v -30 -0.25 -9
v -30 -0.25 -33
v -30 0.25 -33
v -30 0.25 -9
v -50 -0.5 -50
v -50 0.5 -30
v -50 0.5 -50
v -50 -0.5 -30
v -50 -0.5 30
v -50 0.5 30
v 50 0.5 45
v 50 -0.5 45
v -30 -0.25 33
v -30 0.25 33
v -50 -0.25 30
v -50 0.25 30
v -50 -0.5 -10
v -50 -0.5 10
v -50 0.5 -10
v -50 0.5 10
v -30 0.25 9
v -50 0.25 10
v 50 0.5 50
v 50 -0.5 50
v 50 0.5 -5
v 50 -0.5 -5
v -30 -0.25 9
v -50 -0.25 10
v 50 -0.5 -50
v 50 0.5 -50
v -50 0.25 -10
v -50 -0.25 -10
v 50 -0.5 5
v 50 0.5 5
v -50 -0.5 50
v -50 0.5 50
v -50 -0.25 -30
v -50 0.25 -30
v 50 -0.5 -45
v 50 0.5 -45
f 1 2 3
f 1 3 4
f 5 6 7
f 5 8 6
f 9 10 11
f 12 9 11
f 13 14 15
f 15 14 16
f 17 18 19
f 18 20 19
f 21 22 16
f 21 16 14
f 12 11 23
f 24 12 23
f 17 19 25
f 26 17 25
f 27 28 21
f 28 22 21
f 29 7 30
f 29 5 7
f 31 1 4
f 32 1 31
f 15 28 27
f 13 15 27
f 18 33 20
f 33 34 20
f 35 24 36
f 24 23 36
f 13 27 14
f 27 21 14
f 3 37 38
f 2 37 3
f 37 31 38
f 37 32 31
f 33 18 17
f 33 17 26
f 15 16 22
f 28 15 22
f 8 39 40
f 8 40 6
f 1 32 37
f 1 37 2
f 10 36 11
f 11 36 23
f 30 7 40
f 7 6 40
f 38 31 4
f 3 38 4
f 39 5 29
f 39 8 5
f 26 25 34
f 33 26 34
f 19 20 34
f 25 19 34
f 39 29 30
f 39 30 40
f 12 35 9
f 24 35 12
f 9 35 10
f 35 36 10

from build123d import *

# Parameters (mm, degrees)
F1_DEPTH = 0.5
F2_DEPTH = 0.25


with BuildPart() as f1:
    # F0 (on Front) → F1 (new body, symmetric)
    with BuildSketch(Plane.XZ):
        Polygon((-30, 33), (50, 45), (50, 50), (-50, 50), (-50, 30), align=None)
        Polygon((-30, -9), (50, -5), (50, 5), (-30, 9), (-50, 10), (-50, -10), align=None)
        Polygon((-50, -50), (50, -50), (50, -45), (-30, -33), (-50, -30), align=None)
    extrude(amount=F1_DEPTH, both=True)


with BuildPart() as f2:
    # F0 (on Front) → F2 (new body, symmetric)
    with BuildSketch(Plane.XZ):
        Polygon((-50, 30), (-50, 10), (-30, 9), (-30, 33), align=None)
        Polygon((-50, -10), (-50, -30), (-30, -33), (-30, -9), align=None)
    extrude(amount=F2_DEPTH, both=True)


solid = Compound([f1.part, f2.part])
